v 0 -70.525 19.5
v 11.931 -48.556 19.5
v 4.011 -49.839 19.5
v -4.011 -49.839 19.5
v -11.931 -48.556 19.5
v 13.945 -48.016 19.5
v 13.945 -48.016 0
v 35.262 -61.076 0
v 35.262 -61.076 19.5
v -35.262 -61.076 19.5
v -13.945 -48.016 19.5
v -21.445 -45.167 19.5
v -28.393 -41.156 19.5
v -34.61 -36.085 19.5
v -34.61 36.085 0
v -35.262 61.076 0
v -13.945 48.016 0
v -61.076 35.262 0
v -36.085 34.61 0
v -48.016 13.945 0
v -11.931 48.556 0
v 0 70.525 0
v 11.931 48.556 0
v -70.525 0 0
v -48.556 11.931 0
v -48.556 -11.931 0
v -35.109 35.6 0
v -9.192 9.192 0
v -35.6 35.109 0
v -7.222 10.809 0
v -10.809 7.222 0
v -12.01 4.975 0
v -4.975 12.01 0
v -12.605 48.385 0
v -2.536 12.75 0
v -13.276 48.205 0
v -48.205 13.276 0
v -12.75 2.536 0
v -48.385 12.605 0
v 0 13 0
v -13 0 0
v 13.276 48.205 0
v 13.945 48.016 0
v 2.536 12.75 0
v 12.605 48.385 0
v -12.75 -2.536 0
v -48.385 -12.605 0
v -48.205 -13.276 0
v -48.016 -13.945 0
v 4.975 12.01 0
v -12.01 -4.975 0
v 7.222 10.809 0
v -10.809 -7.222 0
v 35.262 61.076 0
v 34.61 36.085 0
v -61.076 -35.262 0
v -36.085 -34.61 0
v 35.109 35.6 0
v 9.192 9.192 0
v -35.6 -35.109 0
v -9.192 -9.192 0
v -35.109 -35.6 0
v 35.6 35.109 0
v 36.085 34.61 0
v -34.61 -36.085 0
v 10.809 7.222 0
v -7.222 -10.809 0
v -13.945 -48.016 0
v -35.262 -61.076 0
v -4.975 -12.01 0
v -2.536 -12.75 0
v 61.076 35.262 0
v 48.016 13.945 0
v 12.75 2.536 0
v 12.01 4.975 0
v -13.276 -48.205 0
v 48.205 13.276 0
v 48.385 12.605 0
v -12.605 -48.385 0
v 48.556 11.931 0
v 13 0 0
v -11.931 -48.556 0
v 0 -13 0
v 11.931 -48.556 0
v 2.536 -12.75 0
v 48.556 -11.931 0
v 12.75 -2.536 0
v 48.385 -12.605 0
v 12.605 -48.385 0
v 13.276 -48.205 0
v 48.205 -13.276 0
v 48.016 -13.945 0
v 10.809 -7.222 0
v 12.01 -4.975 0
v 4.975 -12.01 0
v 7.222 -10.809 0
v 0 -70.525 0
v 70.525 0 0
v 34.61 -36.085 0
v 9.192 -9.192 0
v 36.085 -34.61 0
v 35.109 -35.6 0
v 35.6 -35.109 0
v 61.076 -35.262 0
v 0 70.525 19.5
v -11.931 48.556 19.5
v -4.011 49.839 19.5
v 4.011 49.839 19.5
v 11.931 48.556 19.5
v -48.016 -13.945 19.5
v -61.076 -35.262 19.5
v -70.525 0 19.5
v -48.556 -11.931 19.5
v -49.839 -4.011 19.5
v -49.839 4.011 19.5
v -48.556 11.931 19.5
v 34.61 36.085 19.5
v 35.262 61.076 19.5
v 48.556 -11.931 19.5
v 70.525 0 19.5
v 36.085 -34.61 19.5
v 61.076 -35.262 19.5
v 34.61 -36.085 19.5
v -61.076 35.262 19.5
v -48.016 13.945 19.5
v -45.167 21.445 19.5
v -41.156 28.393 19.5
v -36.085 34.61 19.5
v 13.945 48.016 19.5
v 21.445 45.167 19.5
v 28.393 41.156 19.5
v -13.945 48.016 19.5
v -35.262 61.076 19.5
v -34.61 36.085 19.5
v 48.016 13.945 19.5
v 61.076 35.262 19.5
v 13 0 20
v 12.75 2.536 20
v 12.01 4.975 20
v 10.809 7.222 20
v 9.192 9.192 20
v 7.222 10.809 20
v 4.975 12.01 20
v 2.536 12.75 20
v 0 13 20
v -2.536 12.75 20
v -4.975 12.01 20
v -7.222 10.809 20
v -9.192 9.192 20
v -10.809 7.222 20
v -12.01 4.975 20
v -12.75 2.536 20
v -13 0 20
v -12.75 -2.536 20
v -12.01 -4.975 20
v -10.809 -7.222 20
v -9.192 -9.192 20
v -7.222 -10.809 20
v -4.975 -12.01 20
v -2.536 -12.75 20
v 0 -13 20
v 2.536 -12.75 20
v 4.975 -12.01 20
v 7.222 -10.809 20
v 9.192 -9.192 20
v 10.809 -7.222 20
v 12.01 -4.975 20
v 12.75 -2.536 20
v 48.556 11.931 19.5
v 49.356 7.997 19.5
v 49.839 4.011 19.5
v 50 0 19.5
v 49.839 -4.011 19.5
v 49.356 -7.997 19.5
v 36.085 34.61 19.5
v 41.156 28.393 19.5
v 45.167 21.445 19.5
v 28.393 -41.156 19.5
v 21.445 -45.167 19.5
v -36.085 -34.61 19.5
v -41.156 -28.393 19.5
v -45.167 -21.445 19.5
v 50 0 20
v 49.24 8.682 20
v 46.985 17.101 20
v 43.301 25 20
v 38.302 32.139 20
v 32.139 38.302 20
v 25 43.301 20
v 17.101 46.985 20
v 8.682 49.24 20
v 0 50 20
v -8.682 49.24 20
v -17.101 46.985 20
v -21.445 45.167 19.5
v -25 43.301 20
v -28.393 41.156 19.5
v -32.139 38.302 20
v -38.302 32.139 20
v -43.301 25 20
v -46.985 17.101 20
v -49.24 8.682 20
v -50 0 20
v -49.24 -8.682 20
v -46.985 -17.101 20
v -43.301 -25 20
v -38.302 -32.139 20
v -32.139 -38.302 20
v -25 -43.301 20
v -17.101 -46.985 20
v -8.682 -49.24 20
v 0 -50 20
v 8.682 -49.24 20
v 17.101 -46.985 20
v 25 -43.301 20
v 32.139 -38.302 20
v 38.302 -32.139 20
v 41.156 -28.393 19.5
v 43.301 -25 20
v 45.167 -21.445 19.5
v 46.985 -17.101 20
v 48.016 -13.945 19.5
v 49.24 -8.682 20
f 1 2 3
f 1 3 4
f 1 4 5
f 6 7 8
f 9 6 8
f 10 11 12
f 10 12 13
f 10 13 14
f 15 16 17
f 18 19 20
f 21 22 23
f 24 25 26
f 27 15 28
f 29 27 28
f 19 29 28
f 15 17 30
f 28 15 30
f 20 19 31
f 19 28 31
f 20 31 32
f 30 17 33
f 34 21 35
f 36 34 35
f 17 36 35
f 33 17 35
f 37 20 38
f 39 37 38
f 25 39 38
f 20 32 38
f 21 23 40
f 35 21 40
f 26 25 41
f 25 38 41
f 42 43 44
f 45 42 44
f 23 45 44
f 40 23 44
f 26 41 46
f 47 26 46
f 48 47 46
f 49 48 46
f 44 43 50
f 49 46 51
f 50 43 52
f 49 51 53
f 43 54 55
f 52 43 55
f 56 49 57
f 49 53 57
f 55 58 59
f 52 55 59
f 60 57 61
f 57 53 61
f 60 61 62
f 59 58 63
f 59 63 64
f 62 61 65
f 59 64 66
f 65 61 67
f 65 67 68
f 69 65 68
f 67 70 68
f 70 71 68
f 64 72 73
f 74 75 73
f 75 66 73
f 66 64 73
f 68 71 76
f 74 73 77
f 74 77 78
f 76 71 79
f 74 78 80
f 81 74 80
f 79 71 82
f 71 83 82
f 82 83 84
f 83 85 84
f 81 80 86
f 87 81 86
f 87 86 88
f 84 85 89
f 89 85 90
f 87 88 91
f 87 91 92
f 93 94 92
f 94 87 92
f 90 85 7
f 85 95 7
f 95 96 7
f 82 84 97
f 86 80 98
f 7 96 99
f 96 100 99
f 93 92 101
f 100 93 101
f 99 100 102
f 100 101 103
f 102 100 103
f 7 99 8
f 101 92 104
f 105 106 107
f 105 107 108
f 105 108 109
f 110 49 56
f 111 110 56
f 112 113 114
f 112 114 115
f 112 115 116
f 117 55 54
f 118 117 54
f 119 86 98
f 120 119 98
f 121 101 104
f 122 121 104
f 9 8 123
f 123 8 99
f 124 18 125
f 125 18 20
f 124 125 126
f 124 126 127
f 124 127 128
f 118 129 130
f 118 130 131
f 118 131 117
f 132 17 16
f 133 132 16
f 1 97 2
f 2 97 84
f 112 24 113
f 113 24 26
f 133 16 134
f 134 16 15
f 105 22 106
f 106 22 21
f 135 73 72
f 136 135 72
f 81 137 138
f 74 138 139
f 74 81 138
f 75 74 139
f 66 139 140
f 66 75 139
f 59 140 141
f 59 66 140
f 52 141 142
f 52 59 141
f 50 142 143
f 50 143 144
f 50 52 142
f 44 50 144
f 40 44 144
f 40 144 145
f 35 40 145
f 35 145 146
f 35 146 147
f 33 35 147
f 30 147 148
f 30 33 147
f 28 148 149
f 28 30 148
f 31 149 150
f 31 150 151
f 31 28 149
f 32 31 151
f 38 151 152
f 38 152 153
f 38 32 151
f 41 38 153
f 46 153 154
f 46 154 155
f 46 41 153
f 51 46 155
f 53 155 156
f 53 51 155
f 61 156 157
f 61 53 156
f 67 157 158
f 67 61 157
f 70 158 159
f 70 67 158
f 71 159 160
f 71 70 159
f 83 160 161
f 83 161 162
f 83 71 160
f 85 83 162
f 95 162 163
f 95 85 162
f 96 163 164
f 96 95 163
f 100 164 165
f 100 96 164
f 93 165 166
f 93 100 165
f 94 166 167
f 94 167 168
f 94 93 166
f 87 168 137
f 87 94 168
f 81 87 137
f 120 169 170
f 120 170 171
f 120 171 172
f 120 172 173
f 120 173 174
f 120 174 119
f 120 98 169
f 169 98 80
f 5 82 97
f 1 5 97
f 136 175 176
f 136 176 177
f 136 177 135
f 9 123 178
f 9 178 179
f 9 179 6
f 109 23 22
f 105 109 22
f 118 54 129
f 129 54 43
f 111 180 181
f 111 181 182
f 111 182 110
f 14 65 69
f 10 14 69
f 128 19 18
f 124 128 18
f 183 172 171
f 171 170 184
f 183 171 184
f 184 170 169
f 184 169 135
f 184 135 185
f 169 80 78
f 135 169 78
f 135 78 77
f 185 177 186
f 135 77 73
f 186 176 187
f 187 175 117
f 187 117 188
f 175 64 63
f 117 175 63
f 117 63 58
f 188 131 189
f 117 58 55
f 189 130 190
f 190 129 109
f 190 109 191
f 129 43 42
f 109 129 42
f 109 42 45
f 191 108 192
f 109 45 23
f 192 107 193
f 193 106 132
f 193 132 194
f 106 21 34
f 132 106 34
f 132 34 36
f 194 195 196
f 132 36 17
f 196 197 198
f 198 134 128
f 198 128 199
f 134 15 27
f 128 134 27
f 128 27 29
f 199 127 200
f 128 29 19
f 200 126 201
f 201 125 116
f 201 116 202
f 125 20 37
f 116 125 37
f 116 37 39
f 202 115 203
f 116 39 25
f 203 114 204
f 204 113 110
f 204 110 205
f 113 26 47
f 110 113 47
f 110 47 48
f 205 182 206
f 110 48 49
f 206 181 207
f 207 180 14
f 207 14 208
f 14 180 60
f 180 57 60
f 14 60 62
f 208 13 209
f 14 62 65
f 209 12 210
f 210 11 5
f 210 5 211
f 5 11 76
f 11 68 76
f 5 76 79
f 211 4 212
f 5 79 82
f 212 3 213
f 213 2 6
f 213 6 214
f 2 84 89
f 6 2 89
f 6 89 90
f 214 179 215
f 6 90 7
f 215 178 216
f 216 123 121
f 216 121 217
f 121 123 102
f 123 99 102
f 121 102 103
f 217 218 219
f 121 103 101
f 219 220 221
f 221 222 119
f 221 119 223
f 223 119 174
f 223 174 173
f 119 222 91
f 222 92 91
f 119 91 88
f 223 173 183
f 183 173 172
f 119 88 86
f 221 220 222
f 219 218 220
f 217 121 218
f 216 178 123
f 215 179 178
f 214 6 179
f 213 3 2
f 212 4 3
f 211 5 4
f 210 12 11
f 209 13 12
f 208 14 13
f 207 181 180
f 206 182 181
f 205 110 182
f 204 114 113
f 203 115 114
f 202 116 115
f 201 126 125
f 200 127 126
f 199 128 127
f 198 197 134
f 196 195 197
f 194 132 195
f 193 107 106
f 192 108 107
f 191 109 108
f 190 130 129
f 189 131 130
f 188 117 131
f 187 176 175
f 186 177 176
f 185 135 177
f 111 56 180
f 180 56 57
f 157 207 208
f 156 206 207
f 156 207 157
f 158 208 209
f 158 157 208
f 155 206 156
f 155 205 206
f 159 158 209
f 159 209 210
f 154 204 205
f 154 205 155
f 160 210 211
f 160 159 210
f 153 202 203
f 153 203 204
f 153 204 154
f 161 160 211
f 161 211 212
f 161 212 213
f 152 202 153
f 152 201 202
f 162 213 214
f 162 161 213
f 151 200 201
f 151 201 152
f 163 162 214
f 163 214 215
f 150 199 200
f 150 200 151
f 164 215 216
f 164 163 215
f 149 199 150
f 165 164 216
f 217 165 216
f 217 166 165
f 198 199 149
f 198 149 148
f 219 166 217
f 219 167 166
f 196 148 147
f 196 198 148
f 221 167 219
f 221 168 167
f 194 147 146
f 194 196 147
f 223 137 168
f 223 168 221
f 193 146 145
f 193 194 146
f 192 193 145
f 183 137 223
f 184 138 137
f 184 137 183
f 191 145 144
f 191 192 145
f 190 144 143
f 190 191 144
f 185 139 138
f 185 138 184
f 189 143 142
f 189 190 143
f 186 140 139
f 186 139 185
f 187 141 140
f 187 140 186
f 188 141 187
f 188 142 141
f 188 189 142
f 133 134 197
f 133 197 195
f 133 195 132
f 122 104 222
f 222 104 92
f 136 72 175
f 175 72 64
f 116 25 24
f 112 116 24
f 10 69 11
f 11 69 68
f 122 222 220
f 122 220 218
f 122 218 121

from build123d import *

# Parameters (mm, degrees)
F0_R            = 50
F1_DEPTH        = 20
F2_R            = 13
F3_DEPTH        = 20
F5_DEPTH        = 19.5
F5_COPIES_COUNT = 12


# Not quite as in the source:
# - a pattern or mirror of a feature is missing from the dataset's text; its kind, count and spacing are read off the source's solid


with BuildPart() as f1:
    # F0 (on Top) → F1 (new body)
    with BuildSketch(Plane.XY):
        Circle(F0_R)
    extrude(amount=F1_DEPTH)

    # F2 (on Top) → F3 (cut)
    with BuildSketch(Plane.XY):
        Circle(F2_R)
    extrude(amount=F3_DEPTH, mode=Mode.SUBTRACT)

    # F4 (on Top) → F5 (join)
    with BuildSketch(Plane.XY):
        with BuildLine():
            Line((0, 70.5249483342), (-11.9310349513, 48.55564236))
            ThreePointArc((-11.9310349513, 48.55564236), (0, 50), (11.9310349513, 48.55564236))
            Line((11.9310349513, 48.55564236), (0, 70.5249483342))
        make_face()
    f5 = extrude(amount=F5_DEPTH)

    # F5_copies: F5 ×12 about axis
    f5_copies_axis = Axis((0, 0, 0), (0, 0, 1))
    for i in range(1, F5_COPIES_COUNT):
        add(f5.rotate(f5_copies_axis, i * 360 / F5_COPIES_COUNT))


solid = f1.part
